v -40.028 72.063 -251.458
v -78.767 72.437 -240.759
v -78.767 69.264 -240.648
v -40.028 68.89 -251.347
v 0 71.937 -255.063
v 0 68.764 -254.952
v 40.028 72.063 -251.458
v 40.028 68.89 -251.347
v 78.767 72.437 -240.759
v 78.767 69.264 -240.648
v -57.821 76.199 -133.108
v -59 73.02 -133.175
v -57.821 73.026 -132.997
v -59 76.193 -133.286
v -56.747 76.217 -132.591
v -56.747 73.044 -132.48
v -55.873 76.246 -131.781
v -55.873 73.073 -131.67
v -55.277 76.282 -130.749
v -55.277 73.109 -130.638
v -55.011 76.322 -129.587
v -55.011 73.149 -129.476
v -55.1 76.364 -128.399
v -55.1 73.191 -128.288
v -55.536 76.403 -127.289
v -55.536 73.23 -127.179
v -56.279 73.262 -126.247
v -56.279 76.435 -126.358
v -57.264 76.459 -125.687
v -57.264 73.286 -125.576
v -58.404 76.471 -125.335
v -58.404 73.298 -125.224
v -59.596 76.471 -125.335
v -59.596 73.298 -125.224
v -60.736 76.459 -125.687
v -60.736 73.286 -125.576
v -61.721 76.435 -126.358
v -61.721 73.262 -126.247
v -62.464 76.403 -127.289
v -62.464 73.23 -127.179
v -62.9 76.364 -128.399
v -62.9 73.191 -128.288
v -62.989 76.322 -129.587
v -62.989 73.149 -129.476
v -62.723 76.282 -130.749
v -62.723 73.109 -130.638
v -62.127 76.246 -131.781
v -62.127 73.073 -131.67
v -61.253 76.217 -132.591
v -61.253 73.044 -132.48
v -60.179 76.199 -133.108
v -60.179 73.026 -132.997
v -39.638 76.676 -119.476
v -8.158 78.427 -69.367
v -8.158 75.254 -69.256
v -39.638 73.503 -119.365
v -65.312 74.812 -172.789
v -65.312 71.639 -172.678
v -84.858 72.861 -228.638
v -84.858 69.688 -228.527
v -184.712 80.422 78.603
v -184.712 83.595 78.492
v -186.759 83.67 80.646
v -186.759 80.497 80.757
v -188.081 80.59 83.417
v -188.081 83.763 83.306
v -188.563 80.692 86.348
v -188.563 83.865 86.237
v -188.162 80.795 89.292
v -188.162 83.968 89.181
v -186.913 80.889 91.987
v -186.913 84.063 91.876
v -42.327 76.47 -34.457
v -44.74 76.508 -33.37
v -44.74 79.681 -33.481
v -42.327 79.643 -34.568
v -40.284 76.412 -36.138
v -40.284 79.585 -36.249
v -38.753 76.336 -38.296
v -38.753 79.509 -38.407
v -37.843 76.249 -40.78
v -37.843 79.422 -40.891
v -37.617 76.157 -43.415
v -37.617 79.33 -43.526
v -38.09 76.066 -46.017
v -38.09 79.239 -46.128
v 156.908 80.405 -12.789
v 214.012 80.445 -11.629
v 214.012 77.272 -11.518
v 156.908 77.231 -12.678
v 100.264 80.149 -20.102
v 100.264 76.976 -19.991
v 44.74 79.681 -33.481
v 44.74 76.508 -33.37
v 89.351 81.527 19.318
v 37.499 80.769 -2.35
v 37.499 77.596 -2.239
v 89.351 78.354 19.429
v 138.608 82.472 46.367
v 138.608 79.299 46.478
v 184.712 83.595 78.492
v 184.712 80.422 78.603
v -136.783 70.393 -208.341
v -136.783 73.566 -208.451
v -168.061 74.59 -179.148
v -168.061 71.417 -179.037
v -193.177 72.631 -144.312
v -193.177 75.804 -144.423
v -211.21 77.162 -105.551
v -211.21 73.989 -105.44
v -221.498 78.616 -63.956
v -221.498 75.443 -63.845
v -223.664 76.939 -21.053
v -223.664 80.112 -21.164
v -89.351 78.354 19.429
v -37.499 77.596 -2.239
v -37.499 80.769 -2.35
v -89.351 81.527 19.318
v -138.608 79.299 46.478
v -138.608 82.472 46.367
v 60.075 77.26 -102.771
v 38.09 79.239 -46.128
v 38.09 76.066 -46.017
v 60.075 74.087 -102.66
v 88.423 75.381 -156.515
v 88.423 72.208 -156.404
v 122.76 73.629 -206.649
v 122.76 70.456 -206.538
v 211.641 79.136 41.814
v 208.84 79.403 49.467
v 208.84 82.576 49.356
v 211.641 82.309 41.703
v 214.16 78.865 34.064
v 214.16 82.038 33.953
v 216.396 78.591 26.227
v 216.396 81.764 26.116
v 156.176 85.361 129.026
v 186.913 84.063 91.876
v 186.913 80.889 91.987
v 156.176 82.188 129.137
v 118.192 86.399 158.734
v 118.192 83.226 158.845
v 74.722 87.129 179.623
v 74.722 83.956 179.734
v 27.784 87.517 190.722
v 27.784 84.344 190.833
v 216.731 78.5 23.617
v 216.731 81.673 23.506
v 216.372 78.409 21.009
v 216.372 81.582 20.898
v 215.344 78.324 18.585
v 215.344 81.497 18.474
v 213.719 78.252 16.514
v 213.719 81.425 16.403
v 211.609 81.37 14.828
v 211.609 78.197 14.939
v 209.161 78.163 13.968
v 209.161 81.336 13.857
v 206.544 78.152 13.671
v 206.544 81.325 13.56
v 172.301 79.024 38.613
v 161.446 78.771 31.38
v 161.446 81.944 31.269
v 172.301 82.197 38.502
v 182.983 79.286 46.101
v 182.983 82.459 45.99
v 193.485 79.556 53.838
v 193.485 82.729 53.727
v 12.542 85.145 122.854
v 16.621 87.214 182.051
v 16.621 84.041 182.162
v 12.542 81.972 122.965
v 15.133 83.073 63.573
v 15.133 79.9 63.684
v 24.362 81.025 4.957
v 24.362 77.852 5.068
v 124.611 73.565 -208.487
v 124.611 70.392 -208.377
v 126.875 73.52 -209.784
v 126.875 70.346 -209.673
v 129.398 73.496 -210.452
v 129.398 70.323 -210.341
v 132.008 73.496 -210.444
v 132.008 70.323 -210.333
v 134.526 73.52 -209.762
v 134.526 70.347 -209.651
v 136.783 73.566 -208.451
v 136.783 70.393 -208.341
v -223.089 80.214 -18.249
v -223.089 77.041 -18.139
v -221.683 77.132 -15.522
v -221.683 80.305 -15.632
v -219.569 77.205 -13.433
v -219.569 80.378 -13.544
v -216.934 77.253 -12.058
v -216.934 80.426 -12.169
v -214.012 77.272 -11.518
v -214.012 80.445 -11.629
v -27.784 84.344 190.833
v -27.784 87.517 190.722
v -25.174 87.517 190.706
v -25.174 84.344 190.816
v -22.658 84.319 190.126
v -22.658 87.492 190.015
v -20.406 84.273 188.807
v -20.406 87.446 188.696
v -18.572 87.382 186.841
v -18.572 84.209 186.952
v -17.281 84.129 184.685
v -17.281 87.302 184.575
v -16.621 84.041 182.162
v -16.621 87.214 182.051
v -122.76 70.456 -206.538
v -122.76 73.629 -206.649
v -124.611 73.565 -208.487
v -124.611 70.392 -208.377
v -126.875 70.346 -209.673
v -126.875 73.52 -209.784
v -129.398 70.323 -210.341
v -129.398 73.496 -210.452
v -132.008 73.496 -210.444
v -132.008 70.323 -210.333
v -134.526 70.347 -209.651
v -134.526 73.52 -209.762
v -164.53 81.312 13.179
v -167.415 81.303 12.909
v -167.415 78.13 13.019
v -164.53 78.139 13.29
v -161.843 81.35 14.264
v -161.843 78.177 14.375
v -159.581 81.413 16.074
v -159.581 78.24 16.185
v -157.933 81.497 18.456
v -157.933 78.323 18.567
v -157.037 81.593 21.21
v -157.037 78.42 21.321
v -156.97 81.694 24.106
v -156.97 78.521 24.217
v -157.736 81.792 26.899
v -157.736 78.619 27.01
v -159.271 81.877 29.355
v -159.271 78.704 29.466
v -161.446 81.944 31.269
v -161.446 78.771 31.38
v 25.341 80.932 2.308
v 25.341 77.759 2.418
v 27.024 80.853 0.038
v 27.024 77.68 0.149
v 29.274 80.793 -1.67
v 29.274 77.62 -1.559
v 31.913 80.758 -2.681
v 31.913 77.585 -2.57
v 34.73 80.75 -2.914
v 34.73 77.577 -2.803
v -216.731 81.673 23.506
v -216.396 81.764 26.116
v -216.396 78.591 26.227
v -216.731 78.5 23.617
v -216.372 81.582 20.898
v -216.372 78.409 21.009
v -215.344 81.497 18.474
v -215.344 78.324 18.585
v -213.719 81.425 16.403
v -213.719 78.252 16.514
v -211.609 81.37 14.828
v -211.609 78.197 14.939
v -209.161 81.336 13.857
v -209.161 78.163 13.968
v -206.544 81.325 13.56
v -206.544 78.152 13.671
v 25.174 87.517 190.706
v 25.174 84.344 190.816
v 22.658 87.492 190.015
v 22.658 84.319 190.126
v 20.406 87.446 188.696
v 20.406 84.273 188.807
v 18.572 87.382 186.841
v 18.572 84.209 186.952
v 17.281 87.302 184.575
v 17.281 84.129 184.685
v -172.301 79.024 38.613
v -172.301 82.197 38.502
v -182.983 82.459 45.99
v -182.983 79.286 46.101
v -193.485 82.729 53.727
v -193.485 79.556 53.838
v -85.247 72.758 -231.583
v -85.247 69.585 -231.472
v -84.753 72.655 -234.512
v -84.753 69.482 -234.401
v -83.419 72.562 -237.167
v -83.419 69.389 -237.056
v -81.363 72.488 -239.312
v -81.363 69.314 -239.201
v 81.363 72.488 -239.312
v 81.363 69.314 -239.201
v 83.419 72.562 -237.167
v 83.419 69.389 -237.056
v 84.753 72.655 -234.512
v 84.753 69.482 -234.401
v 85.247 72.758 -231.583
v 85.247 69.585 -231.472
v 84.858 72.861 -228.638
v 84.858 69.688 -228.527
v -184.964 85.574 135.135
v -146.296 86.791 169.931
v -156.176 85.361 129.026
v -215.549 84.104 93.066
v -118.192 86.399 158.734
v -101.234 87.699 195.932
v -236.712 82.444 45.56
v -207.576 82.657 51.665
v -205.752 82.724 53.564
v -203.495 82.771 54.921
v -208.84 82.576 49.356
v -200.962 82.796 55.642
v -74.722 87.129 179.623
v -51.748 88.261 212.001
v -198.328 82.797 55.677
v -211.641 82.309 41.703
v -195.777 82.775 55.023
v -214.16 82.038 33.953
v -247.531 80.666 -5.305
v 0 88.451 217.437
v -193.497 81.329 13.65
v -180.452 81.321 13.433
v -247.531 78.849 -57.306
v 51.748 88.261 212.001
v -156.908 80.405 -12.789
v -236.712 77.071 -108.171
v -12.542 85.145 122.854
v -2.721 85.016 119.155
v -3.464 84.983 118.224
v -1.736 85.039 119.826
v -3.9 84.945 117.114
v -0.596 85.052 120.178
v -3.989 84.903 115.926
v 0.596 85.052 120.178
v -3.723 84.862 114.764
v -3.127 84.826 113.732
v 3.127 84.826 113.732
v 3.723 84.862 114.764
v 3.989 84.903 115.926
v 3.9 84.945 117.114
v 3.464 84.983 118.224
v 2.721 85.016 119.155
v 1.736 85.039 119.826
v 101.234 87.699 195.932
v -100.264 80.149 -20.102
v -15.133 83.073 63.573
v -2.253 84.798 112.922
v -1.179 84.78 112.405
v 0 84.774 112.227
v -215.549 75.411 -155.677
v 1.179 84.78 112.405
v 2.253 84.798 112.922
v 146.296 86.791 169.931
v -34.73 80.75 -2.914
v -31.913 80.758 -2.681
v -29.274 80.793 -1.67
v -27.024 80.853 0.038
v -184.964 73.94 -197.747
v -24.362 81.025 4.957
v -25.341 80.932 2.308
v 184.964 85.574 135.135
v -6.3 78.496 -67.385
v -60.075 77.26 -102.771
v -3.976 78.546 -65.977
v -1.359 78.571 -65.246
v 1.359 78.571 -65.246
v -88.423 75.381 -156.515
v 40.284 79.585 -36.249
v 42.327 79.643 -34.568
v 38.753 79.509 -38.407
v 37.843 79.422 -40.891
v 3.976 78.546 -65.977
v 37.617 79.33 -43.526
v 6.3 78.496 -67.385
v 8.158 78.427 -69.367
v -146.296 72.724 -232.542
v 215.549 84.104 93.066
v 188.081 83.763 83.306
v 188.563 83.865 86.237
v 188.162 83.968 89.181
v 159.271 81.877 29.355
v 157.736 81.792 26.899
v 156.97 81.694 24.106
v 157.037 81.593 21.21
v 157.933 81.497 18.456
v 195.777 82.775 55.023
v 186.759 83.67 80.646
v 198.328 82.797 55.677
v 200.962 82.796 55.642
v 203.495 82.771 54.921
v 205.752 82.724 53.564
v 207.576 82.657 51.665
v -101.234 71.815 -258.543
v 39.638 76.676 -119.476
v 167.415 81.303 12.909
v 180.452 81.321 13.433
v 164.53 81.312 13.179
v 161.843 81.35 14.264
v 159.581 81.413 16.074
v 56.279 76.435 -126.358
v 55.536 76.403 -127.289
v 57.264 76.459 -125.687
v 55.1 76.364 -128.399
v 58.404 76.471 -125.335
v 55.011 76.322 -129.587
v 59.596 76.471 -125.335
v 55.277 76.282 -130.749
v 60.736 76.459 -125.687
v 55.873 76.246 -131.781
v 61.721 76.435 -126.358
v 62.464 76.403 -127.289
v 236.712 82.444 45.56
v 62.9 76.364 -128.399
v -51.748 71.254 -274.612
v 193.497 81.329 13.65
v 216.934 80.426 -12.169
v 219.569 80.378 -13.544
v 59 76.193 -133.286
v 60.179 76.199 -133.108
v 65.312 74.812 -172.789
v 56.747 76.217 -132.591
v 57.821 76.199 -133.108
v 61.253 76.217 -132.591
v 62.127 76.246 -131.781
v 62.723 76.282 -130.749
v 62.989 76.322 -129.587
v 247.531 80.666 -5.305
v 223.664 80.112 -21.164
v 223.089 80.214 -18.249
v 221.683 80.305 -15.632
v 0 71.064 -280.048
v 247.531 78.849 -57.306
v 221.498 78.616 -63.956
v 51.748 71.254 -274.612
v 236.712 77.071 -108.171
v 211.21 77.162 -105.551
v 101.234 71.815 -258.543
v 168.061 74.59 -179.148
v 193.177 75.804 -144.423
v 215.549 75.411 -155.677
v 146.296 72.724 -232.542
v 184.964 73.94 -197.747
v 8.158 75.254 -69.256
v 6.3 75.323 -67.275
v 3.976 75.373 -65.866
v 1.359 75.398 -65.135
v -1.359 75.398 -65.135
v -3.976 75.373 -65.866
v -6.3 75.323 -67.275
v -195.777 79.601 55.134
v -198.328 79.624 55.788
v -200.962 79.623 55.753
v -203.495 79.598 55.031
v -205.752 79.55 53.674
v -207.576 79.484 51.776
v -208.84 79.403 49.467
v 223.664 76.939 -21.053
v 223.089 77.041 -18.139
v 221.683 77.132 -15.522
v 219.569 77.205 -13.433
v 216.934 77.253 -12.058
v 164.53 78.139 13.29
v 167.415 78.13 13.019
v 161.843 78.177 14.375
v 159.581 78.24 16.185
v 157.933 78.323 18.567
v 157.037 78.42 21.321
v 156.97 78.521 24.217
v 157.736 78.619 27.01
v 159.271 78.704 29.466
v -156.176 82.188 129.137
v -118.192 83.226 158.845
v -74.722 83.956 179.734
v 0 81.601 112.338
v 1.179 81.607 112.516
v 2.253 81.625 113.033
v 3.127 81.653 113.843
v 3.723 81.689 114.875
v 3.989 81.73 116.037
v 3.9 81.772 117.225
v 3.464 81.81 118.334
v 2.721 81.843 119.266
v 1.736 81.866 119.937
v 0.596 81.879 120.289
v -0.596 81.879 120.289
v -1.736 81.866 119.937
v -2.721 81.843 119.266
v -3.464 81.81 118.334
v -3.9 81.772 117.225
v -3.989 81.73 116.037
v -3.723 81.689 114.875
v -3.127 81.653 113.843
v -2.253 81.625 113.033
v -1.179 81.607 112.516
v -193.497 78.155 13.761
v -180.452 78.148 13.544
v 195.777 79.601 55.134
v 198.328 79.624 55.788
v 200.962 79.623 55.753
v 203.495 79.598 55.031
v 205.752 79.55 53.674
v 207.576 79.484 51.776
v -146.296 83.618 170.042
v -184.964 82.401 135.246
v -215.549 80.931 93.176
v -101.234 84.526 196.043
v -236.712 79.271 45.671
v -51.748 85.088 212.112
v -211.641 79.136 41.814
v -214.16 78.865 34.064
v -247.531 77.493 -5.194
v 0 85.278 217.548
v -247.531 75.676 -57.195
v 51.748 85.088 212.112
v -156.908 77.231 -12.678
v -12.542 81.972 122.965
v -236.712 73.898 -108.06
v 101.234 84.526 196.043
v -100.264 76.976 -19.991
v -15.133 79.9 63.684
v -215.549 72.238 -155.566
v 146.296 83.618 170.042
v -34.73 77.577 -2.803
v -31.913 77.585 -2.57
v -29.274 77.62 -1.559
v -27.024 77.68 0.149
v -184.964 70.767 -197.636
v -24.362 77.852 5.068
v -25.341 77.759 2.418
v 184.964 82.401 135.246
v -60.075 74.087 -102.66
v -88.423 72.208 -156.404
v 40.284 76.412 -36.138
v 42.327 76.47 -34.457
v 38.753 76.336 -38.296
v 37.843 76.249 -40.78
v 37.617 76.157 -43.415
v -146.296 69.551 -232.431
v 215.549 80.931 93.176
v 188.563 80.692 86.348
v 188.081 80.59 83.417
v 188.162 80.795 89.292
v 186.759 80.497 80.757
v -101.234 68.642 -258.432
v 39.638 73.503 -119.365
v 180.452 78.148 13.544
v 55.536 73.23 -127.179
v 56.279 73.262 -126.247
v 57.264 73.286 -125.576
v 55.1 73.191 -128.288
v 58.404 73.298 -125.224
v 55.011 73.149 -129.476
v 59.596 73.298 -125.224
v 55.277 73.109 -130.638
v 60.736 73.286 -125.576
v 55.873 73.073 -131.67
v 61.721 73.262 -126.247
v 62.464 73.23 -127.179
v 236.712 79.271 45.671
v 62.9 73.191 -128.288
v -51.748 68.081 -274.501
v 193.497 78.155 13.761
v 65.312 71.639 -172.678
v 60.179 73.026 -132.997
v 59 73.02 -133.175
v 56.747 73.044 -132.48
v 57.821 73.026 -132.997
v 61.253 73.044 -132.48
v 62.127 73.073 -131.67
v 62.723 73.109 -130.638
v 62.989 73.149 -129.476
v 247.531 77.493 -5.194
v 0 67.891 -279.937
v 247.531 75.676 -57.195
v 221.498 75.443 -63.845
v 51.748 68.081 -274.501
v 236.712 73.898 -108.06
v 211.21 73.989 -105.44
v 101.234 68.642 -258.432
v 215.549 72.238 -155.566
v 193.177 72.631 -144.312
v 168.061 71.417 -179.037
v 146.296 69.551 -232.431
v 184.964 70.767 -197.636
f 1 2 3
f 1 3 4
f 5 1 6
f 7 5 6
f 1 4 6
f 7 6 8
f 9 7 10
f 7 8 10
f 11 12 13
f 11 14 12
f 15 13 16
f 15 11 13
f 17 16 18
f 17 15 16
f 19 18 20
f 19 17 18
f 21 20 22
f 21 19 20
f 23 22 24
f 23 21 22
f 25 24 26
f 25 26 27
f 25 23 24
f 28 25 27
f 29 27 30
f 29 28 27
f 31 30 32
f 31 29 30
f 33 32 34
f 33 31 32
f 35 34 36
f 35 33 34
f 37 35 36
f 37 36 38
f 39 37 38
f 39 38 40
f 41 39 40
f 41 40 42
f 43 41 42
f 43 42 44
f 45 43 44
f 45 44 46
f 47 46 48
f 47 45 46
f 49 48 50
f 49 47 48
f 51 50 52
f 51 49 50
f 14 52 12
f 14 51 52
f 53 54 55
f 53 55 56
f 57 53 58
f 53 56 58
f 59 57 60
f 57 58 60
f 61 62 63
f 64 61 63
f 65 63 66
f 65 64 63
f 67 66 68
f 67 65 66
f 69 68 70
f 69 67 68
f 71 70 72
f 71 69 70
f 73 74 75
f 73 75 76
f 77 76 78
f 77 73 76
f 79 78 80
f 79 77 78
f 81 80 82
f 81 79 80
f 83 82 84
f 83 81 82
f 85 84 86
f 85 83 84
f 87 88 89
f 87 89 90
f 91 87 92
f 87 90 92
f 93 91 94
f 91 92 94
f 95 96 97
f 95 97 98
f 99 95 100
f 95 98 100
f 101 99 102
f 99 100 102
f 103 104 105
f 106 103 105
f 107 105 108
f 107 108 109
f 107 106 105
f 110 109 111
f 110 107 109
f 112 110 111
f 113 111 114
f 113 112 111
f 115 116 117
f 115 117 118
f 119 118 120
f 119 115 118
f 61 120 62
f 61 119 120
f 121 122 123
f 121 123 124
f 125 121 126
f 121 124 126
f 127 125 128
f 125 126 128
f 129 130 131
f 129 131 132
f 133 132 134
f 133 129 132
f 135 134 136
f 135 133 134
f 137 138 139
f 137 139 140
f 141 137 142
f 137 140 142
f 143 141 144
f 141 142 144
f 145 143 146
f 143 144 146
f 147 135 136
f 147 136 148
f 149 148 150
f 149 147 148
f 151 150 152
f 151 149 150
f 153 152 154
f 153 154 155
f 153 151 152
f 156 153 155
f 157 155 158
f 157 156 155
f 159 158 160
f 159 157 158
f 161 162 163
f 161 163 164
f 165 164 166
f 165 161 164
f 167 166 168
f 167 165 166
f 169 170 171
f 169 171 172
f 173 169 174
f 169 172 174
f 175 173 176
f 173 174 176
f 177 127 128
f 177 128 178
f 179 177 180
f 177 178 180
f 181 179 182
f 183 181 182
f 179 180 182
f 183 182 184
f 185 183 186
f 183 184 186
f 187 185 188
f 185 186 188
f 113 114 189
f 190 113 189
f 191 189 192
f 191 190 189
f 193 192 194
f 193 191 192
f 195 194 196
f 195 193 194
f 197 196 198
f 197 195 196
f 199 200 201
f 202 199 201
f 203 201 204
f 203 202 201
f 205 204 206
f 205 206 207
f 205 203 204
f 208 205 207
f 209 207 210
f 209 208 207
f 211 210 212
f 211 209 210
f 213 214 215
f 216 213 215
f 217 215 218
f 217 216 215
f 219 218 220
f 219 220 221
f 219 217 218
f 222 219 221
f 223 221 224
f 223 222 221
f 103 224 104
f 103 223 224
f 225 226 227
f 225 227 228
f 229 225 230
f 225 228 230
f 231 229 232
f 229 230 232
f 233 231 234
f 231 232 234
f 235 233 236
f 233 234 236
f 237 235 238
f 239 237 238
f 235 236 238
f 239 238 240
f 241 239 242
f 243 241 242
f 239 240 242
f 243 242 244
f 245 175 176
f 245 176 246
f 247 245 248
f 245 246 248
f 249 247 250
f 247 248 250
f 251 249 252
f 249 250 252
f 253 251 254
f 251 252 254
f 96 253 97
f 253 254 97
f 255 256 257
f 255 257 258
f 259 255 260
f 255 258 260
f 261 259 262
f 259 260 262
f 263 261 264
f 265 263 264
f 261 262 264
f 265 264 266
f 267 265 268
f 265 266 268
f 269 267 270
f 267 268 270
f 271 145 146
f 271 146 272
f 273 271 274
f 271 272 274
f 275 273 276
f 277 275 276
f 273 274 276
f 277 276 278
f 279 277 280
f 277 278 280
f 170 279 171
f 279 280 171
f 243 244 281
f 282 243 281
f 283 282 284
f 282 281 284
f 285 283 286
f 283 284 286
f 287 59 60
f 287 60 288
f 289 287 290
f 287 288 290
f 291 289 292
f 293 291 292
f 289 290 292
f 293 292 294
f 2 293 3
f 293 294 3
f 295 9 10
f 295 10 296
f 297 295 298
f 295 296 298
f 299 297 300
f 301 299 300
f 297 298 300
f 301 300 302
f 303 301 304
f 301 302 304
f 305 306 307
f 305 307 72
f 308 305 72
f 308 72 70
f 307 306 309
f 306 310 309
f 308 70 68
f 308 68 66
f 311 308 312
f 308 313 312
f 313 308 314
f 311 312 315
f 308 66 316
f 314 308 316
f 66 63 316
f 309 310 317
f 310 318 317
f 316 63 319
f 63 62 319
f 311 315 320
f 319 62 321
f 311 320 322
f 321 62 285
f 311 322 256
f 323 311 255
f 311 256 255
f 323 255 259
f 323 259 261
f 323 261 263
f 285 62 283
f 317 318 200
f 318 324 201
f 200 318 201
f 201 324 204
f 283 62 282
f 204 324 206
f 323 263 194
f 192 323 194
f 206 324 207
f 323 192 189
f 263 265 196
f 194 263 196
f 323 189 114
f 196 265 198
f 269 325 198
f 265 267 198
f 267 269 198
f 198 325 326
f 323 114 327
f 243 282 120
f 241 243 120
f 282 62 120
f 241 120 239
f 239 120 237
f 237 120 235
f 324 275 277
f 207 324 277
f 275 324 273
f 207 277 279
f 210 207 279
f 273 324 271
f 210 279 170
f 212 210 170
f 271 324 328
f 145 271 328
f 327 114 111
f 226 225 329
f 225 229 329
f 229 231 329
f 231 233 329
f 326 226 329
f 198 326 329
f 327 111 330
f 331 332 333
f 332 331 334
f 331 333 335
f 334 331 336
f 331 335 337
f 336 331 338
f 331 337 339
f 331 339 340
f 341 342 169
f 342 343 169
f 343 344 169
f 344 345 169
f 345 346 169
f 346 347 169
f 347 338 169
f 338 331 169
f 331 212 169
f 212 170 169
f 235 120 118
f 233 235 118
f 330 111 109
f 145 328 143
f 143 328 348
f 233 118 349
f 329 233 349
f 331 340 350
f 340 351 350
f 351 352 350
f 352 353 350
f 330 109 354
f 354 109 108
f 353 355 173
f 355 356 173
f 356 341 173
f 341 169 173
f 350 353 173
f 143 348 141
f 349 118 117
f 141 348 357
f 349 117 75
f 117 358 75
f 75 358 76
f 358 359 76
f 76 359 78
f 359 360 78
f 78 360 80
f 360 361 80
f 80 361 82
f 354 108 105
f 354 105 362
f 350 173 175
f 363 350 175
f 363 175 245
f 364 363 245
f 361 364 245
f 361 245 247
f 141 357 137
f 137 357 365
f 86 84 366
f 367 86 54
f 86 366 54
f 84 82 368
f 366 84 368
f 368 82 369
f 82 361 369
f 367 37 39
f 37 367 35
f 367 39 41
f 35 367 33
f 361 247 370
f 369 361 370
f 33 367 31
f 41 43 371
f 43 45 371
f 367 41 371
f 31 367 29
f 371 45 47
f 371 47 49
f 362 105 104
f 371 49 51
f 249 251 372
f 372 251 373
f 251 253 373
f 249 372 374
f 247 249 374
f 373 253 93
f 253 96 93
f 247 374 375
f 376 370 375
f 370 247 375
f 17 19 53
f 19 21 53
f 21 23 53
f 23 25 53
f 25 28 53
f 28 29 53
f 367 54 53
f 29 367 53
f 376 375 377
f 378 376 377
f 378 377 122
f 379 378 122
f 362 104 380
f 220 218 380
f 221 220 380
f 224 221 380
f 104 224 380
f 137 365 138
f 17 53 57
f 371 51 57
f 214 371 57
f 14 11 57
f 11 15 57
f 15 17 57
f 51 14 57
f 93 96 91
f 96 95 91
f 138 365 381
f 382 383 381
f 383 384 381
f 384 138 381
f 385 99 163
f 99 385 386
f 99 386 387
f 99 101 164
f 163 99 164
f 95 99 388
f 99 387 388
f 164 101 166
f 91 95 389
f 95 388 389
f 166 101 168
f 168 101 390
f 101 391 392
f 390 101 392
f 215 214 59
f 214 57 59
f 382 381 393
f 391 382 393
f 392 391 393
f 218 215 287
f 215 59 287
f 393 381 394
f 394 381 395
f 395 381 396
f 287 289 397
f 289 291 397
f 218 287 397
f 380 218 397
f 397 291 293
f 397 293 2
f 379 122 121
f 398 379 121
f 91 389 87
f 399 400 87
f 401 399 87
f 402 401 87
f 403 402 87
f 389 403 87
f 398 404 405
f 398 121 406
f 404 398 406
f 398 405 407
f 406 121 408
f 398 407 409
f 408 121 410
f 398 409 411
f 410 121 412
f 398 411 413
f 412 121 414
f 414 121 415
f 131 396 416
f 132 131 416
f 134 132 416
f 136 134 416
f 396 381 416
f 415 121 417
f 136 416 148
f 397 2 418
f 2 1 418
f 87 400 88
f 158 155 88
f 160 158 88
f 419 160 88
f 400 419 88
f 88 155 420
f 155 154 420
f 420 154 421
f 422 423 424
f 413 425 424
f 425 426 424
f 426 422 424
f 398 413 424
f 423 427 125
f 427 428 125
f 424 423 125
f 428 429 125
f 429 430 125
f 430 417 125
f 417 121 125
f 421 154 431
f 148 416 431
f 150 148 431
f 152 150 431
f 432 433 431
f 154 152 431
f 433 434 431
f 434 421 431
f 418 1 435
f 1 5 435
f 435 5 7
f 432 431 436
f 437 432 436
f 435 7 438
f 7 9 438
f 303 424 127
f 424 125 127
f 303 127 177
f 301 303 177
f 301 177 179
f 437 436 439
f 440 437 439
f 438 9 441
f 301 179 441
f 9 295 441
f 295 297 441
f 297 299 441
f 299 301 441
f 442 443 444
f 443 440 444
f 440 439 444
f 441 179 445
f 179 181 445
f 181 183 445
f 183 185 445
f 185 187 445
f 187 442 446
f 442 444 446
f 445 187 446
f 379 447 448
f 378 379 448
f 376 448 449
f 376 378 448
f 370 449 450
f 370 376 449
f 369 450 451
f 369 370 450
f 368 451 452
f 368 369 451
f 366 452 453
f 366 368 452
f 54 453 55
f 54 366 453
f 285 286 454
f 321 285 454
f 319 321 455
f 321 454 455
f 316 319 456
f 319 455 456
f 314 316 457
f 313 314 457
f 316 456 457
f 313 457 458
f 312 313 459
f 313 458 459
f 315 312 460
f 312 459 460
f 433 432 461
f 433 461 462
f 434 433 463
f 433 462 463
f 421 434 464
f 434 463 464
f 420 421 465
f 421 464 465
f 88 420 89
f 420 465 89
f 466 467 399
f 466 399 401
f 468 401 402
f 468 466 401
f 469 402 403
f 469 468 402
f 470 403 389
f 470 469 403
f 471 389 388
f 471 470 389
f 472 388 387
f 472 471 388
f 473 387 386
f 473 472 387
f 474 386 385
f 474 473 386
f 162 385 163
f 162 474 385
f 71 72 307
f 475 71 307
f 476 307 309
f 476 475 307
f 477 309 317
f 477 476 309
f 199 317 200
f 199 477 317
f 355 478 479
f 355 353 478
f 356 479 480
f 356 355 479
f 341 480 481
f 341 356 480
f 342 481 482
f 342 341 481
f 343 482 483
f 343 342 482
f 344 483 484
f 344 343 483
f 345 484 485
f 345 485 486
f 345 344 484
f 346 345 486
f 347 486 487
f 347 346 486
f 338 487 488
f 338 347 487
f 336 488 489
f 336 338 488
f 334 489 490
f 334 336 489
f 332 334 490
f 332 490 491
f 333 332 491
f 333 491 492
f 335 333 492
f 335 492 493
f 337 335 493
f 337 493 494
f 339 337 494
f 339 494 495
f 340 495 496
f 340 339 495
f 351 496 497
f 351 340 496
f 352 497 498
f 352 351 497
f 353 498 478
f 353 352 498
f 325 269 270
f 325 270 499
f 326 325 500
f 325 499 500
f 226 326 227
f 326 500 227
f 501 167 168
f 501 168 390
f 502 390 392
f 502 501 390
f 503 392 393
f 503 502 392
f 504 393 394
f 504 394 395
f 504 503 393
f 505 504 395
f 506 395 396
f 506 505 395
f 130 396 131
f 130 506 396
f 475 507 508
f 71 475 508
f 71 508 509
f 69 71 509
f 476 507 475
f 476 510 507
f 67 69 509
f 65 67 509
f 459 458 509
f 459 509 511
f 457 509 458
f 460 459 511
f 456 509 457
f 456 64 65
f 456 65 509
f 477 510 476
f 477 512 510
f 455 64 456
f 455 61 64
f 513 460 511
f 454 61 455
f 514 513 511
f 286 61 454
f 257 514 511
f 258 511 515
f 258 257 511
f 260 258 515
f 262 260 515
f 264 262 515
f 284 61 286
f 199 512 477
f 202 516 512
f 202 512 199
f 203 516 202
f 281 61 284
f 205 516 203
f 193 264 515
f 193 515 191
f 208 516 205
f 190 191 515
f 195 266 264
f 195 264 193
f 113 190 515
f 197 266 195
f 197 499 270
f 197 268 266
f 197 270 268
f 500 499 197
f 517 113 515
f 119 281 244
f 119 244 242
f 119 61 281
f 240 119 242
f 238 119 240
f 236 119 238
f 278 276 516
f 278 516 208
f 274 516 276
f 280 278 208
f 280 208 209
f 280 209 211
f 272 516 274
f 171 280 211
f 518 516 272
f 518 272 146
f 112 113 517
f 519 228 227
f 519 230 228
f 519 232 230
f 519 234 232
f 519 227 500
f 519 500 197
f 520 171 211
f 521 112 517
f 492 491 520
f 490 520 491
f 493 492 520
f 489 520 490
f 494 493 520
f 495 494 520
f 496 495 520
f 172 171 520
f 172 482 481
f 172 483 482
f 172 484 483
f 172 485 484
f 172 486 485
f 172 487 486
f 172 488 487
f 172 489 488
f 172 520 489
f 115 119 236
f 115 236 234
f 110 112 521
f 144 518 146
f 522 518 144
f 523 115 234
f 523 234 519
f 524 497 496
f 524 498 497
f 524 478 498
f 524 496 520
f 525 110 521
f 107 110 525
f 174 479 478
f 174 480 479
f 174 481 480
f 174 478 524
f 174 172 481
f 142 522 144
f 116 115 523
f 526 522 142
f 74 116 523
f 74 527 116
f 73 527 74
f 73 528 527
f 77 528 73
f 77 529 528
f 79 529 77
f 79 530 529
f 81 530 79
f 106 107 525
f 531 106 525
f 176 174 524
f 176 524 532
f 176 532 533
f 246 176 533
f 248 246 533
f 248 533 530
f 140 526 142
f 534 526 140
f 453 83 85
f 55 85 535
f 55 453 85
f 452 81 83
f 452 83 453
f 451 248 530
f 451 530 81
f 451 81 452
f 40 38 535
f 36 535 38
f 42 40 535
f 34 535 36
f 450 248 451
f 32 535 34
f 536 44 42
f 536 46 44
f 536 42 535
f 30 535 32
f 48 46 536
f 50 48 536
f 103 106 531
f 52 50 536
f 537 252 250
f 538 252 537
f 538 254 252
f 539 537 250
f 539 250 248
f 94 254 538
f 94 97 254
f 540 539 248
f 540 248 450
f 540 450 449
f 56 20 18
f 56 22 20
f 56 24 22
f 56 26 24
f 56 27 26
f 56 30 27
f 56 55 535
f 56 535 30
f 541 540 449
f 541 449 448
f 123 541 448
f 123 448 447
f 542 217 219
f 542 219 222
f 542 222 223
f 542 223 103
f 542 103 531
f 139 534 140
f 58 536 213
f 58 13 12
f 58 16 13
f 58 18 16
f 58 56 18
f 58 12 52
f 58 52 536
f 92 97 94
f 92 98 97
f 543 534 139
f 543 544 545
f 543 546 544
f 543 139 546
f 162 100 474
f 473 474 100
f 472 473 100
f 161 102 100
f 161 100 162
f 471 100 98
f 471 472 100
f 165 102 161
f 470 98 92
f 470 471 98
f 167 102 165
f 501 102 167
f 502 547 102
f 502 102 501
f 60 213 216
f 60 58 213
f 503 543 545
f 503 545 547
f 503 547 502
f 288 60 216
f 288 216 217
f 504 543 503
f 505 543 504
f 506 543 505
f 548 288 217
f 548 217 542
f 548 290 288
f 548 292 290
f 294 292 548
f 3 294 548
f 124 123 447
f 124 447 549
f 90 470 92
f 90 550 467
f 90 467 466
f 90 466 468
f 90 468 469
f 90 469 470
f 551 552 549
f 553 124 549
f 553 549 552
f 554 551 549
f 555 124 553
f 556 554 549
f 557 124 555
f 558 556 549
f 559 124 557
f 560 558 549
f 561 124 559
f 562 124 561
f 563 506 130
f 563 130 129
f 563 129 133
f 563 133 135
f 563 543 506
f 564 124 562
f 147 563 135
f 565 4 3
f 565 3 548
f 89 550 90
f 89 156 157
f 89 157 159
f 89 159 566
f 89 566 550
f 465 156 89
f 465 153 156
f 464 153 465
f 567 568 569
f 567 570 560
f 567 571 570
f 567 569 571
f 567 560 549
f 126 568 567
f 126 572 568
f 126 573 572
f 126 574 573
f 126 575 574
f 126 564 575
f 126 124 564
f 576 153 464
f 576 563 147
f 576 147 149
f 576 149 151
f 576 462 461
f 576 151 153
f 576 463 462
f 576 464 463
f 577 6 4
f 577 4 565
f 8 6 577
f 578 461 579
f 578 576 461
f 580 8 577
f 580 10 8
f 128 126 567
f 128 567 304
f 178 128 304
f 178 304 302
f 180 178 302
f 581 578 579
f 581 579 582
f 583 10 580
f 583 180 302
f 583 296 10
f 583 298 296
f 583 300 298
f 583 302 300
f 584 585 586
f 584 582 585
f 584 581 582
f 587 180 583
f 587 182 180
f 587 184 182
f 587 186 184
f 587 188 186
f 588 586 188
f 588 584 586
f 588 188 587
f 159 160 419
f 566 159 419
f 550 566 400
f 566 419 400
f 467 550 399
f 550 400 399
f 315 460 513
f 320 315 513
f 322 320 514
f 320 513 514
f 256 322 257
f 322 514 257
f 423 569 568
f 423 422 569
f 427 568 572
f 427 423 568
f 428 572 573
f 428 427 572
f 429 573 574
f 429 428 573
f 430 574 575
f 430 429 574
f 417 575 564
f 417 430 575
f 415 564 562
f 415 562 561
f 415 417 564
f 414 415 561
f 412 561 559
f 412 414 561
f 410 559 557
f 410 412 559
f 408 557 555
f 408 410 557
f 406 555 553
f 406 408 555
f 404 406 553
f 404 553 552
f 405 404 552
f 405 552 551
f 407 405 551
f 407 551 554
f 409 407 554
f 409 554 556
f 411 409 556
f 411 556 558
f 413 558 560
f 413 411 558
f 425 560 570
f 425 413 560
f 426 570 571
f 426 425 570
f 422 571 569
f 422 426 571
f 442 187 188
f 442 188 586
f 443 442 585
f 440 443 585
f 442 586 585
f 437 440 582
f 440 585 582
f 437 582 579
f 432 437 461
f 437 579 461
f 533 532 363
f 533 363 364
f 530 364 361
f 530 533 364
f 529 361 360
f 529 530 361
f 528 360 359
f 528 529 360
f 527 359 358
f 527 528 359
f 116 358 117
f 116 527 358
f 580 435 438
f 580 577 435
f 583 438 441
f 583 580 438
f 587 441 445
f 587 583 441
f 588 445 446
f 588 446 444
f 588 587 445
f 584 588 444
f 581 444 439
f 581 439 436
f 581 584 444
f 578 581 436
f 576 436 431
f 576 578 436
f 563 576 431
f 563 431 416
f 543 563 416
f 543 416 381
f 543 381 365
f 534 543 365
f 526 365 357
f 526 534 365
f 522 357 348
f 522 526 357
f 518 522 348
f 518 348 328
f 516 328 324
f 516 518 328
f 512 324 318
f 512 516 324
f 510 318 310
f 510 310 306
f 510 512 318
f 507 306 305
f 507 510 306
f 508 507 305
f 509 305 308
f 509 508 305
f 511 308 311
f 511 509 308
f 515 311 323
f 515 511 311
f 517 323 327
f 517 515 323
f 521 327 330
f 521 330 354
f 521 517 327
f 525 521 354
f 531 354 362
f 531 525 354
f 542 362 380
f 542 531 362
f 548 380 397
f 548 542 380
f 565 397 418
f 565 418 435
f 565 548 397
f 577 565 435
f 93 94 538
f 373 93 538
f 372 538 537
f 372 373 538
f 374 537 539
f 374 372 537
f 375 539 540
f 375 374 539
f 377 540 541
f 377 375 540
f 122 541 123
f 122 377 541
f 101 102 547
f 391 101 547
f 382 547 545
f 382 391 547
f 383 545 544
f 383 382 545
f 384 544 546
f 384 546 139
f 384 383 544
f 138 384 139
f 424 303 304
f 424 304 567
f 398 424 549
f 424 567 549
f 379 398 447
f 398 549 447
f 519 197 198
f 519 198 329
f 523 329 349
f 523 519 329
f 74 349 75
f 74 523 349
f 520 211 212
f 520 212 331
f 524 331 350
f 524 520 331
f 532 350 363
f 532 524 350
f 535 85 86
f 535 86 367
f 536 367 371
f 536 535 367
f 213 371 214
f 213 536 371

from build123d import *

# Parameters (mm, degrees)
SKETCH1_R           = 248.894047882
SKETCH1_R_2         = 4
BOSS_EXTRUDE1_DEPTH = 1.5875


with BuildPart() as part:
    # Sketch1 → Boss-Extrude1 (new, symmetric)
    with BuildSketch(Plane(origin=(0, 79.166310833, -2.766864901), x_dir=(0, -0.03492870325036397, -0.9993898066766781), z_dir=(0, -0.9993898066766781, 0.03492870325036397))):
        with Locations((28.500583785, 0)):
            Circle(SKETCH1_R)
        with Locations((-119.119809099, 0)):
            Circle(SKETCH1_R_2, mode=Mode.SUBTRACT)
        with Locations((126.54316519, -59)):
            Circle(SKETCH1_R_2, mode=Mode.SUBTRACT)
        with Locations((126.54316519, 59)):
            Circle(SKETCH1_R_2, mode=Mode.SUBTRACT)
        with BuildLine():
            ThreePointArc((238.081851524, -78.766978422), (252.394631667, 0), (238.081851524, 78.766978422))
            ThreePointArc((238.081851524, 78.766978422), (233.209259095, 84.18518249), (225.953504109, 84.858318353))
            ThreePointArc((225.953504109, 84.858318353), (143.037826046, 53.222841583), (66.585433619, 8.157946694))
            ThreePointArc((66.585433619, 8.157946694), (62.36885006, 0), (66.585433619, -8.157946694))
            ThreePointArc((66.585433619, -8.157946694), (143.037826046, -53.222841583), (225.953504109, -84.858318353))
            ThreePointArc((225.953504109, -84.858318353), (233.209259095, -84.18518249), (238.081851524, -78.766978422))
        make_face(mode=Mode.SUBTRACT)
        with BuildLine():
            ThreePointArc((-184.986589143, 16.62098717), (-96.058103224, 13.003455955), (-7.783793413, 24.361640995))
            ThreePointArc((-7.783793413, 24.361640995), (-1.152695169, 29.274262086), (-0.472616045, 37.498786528))
            ThreePointArc((-0.472616045, 37.498786528), (-35.031535638, 114.339868269), (-81.363716284, 184.71173625))
            ThreePointArc((-81.363716284, 184.71173625), (-87.629404707, 188.431983672), (-94.756155234, 186.912602473))
            ThreePointArc((-94.756155234, 186.912602473), (-161.65529586, 118.191734539), (-193.66286294, 27.783945296))
            ThreePointArc((-193.66286294, 27.783945296), (-191.635746069, 20.406253949), (-184.986589143, 16.62098717))
        make_face(mode=Mode.SUBTRACT)
        with BuildLine():
            ThreePointArc((-184.986589143, -16.62098717), (-96.058103224, -13.003455955), (-7.783793413, -24.361640995))
            ThreePointArc((-7.783793413, -24.361640995), (-1.152695169, -29.274262086), (-0.472616045, -37.498786528))
            ThreePointArc((-0.472616045, -37.498786528), (-35.031535638, -114.339868269), (-81.363716284, -184.71173625))
            ThreePointArc((-81.363716284, -184.71173625), (-87.629404707, -188.431983672), (-94.756155234, -186.912602473))
            ThreePointArc((-94.756155234, -186.912602473), (-161.65529586, -118.191734539), (-193.66286294, -27.783945296))
            ThreePointArc((-193.66286294, -27.783945296), (-191.635746069, -20.406253949), (-184.986589143, -16.62098717))
        make_face(mode=Mode.SUBTRACT)
        with BuildLine():
            ThreePointArc((205.754686462, 136.78277582), (122.671836524, 203.126364203), (18.352909122, 223.663965305))
            ThreePointArc((18.352909122, 223.663965305), (11.694176969, 220.704171659), (8.811835123, 214.01154902))
            ThreePointArc((8.811835123, 214.01154902), (12.86563705, 128.486999921), (30.677726566, 44.739693841))
            ThreePointArc((30.677726566, 44.739693841), (35.60655975, 38.753388876), (43.332423143, 38.089854005))
            ThreePointArc((43.332423143, 38.089854005), (127.305687629, 73.474816574), (203.951454434, 122.760018767))
            ThreePointArc((203.951454434, 122.760018767), (207.756142558, 129.39808179), (205.754686462, 136.78277582))
        make_face(mode=Mode.SUBTRACT)
        with BuildLine():
            ThreePointArc((8.811835123, -214.01154902), (12.86563705, -128.486999921), (30.677726566, -44.739693841))
            ThreePointArc((30.677726566, -44.739693841), (35.60655975, -38.753388876), (43.332423143, -38.089854005))
            ThreePointArc((43.332423143, -38.089854005), (127.305687629, -73.474816574), (203.951454434, -122.760018767))
            ThreePointArc((203.951454434, -122.760018767), (207.756142558, -129.39808179), (205.754686462, -136.78277582))
            ThreePointArc((205.754686462, -136.78277582), (122.671836524, -203.126364203), (18.352909122, -223.663965305))
            ThreePointArc((18.352909122, -223.663965305), (11.694176969, -220.704171659), (8.811835123, -214.01154902))
        make_face(mode=Mode.SUBTRACT)
        with BuildLine():
            ThreePointArc((-52.210070583, -208.840453333), (-40.68648195, -212.935893198), (-28.956463756, -216.3960082))
            ThreePointArc((-28.956463756, -216.3960082), (-20.219684914, -214.600125685), (-16.391954321, -206.543763165))
            ThreePointArc((-16.391954321, -206.543763165), (-16.412181984, -186.973684298), (-15.74049523, -167.415125227))
            ThreePointArc((-15.74049523, -167.415125227), (-22.636803093, -157.38469373), (-34.111773062, -161.445935215))
            ThreePointArc((-34.111773062, -161.445935215), (-45.06459964, -177.663949457), (-56.583967908, -193.484586319))
            ThreePointArc((-56.583967908, -193.484586319), (-58.222679885, -202.252204103), (-52.210070583, -208.840453333))
        make_face(mode=Mode.SUBTRACT)
        with BuildLine():
            ThreePointArc((-16.391954321, 206.543763165), (-16.412181984, 186.973684298), (-15.74049523, 167.415125227))
            ThreePointArc((-15.74049523, 167.415125227), (-22.636803093, 157.38469373), (-34.111773062, 161.445935215))
            ThreePointArc((-34.111773062, 161.445935215), (-45.06459964, 177.663949457), (-56.583967908, 193.484586319))
            ThreePointArc((-56.583967908, 193.484586319), (-58.222679885, 202.252204103), (-52.210070583, 208.840453333))
            ThreePointArc((-52.210070583, 208.840453333), (-40.68648195, 212.935893198), (-28.956463756, 216.3960082))
            ThreePointArc((-28.956463756, 216.3960082), (-20.219684914, 214.600125685), (-16.391954321, 206.543763165))
        make_face(mode=Mode.SUBTRACT)
    extrude(amount=BOSS_EXTRUDE1_DEPTH, both=True)


solid = part.part
